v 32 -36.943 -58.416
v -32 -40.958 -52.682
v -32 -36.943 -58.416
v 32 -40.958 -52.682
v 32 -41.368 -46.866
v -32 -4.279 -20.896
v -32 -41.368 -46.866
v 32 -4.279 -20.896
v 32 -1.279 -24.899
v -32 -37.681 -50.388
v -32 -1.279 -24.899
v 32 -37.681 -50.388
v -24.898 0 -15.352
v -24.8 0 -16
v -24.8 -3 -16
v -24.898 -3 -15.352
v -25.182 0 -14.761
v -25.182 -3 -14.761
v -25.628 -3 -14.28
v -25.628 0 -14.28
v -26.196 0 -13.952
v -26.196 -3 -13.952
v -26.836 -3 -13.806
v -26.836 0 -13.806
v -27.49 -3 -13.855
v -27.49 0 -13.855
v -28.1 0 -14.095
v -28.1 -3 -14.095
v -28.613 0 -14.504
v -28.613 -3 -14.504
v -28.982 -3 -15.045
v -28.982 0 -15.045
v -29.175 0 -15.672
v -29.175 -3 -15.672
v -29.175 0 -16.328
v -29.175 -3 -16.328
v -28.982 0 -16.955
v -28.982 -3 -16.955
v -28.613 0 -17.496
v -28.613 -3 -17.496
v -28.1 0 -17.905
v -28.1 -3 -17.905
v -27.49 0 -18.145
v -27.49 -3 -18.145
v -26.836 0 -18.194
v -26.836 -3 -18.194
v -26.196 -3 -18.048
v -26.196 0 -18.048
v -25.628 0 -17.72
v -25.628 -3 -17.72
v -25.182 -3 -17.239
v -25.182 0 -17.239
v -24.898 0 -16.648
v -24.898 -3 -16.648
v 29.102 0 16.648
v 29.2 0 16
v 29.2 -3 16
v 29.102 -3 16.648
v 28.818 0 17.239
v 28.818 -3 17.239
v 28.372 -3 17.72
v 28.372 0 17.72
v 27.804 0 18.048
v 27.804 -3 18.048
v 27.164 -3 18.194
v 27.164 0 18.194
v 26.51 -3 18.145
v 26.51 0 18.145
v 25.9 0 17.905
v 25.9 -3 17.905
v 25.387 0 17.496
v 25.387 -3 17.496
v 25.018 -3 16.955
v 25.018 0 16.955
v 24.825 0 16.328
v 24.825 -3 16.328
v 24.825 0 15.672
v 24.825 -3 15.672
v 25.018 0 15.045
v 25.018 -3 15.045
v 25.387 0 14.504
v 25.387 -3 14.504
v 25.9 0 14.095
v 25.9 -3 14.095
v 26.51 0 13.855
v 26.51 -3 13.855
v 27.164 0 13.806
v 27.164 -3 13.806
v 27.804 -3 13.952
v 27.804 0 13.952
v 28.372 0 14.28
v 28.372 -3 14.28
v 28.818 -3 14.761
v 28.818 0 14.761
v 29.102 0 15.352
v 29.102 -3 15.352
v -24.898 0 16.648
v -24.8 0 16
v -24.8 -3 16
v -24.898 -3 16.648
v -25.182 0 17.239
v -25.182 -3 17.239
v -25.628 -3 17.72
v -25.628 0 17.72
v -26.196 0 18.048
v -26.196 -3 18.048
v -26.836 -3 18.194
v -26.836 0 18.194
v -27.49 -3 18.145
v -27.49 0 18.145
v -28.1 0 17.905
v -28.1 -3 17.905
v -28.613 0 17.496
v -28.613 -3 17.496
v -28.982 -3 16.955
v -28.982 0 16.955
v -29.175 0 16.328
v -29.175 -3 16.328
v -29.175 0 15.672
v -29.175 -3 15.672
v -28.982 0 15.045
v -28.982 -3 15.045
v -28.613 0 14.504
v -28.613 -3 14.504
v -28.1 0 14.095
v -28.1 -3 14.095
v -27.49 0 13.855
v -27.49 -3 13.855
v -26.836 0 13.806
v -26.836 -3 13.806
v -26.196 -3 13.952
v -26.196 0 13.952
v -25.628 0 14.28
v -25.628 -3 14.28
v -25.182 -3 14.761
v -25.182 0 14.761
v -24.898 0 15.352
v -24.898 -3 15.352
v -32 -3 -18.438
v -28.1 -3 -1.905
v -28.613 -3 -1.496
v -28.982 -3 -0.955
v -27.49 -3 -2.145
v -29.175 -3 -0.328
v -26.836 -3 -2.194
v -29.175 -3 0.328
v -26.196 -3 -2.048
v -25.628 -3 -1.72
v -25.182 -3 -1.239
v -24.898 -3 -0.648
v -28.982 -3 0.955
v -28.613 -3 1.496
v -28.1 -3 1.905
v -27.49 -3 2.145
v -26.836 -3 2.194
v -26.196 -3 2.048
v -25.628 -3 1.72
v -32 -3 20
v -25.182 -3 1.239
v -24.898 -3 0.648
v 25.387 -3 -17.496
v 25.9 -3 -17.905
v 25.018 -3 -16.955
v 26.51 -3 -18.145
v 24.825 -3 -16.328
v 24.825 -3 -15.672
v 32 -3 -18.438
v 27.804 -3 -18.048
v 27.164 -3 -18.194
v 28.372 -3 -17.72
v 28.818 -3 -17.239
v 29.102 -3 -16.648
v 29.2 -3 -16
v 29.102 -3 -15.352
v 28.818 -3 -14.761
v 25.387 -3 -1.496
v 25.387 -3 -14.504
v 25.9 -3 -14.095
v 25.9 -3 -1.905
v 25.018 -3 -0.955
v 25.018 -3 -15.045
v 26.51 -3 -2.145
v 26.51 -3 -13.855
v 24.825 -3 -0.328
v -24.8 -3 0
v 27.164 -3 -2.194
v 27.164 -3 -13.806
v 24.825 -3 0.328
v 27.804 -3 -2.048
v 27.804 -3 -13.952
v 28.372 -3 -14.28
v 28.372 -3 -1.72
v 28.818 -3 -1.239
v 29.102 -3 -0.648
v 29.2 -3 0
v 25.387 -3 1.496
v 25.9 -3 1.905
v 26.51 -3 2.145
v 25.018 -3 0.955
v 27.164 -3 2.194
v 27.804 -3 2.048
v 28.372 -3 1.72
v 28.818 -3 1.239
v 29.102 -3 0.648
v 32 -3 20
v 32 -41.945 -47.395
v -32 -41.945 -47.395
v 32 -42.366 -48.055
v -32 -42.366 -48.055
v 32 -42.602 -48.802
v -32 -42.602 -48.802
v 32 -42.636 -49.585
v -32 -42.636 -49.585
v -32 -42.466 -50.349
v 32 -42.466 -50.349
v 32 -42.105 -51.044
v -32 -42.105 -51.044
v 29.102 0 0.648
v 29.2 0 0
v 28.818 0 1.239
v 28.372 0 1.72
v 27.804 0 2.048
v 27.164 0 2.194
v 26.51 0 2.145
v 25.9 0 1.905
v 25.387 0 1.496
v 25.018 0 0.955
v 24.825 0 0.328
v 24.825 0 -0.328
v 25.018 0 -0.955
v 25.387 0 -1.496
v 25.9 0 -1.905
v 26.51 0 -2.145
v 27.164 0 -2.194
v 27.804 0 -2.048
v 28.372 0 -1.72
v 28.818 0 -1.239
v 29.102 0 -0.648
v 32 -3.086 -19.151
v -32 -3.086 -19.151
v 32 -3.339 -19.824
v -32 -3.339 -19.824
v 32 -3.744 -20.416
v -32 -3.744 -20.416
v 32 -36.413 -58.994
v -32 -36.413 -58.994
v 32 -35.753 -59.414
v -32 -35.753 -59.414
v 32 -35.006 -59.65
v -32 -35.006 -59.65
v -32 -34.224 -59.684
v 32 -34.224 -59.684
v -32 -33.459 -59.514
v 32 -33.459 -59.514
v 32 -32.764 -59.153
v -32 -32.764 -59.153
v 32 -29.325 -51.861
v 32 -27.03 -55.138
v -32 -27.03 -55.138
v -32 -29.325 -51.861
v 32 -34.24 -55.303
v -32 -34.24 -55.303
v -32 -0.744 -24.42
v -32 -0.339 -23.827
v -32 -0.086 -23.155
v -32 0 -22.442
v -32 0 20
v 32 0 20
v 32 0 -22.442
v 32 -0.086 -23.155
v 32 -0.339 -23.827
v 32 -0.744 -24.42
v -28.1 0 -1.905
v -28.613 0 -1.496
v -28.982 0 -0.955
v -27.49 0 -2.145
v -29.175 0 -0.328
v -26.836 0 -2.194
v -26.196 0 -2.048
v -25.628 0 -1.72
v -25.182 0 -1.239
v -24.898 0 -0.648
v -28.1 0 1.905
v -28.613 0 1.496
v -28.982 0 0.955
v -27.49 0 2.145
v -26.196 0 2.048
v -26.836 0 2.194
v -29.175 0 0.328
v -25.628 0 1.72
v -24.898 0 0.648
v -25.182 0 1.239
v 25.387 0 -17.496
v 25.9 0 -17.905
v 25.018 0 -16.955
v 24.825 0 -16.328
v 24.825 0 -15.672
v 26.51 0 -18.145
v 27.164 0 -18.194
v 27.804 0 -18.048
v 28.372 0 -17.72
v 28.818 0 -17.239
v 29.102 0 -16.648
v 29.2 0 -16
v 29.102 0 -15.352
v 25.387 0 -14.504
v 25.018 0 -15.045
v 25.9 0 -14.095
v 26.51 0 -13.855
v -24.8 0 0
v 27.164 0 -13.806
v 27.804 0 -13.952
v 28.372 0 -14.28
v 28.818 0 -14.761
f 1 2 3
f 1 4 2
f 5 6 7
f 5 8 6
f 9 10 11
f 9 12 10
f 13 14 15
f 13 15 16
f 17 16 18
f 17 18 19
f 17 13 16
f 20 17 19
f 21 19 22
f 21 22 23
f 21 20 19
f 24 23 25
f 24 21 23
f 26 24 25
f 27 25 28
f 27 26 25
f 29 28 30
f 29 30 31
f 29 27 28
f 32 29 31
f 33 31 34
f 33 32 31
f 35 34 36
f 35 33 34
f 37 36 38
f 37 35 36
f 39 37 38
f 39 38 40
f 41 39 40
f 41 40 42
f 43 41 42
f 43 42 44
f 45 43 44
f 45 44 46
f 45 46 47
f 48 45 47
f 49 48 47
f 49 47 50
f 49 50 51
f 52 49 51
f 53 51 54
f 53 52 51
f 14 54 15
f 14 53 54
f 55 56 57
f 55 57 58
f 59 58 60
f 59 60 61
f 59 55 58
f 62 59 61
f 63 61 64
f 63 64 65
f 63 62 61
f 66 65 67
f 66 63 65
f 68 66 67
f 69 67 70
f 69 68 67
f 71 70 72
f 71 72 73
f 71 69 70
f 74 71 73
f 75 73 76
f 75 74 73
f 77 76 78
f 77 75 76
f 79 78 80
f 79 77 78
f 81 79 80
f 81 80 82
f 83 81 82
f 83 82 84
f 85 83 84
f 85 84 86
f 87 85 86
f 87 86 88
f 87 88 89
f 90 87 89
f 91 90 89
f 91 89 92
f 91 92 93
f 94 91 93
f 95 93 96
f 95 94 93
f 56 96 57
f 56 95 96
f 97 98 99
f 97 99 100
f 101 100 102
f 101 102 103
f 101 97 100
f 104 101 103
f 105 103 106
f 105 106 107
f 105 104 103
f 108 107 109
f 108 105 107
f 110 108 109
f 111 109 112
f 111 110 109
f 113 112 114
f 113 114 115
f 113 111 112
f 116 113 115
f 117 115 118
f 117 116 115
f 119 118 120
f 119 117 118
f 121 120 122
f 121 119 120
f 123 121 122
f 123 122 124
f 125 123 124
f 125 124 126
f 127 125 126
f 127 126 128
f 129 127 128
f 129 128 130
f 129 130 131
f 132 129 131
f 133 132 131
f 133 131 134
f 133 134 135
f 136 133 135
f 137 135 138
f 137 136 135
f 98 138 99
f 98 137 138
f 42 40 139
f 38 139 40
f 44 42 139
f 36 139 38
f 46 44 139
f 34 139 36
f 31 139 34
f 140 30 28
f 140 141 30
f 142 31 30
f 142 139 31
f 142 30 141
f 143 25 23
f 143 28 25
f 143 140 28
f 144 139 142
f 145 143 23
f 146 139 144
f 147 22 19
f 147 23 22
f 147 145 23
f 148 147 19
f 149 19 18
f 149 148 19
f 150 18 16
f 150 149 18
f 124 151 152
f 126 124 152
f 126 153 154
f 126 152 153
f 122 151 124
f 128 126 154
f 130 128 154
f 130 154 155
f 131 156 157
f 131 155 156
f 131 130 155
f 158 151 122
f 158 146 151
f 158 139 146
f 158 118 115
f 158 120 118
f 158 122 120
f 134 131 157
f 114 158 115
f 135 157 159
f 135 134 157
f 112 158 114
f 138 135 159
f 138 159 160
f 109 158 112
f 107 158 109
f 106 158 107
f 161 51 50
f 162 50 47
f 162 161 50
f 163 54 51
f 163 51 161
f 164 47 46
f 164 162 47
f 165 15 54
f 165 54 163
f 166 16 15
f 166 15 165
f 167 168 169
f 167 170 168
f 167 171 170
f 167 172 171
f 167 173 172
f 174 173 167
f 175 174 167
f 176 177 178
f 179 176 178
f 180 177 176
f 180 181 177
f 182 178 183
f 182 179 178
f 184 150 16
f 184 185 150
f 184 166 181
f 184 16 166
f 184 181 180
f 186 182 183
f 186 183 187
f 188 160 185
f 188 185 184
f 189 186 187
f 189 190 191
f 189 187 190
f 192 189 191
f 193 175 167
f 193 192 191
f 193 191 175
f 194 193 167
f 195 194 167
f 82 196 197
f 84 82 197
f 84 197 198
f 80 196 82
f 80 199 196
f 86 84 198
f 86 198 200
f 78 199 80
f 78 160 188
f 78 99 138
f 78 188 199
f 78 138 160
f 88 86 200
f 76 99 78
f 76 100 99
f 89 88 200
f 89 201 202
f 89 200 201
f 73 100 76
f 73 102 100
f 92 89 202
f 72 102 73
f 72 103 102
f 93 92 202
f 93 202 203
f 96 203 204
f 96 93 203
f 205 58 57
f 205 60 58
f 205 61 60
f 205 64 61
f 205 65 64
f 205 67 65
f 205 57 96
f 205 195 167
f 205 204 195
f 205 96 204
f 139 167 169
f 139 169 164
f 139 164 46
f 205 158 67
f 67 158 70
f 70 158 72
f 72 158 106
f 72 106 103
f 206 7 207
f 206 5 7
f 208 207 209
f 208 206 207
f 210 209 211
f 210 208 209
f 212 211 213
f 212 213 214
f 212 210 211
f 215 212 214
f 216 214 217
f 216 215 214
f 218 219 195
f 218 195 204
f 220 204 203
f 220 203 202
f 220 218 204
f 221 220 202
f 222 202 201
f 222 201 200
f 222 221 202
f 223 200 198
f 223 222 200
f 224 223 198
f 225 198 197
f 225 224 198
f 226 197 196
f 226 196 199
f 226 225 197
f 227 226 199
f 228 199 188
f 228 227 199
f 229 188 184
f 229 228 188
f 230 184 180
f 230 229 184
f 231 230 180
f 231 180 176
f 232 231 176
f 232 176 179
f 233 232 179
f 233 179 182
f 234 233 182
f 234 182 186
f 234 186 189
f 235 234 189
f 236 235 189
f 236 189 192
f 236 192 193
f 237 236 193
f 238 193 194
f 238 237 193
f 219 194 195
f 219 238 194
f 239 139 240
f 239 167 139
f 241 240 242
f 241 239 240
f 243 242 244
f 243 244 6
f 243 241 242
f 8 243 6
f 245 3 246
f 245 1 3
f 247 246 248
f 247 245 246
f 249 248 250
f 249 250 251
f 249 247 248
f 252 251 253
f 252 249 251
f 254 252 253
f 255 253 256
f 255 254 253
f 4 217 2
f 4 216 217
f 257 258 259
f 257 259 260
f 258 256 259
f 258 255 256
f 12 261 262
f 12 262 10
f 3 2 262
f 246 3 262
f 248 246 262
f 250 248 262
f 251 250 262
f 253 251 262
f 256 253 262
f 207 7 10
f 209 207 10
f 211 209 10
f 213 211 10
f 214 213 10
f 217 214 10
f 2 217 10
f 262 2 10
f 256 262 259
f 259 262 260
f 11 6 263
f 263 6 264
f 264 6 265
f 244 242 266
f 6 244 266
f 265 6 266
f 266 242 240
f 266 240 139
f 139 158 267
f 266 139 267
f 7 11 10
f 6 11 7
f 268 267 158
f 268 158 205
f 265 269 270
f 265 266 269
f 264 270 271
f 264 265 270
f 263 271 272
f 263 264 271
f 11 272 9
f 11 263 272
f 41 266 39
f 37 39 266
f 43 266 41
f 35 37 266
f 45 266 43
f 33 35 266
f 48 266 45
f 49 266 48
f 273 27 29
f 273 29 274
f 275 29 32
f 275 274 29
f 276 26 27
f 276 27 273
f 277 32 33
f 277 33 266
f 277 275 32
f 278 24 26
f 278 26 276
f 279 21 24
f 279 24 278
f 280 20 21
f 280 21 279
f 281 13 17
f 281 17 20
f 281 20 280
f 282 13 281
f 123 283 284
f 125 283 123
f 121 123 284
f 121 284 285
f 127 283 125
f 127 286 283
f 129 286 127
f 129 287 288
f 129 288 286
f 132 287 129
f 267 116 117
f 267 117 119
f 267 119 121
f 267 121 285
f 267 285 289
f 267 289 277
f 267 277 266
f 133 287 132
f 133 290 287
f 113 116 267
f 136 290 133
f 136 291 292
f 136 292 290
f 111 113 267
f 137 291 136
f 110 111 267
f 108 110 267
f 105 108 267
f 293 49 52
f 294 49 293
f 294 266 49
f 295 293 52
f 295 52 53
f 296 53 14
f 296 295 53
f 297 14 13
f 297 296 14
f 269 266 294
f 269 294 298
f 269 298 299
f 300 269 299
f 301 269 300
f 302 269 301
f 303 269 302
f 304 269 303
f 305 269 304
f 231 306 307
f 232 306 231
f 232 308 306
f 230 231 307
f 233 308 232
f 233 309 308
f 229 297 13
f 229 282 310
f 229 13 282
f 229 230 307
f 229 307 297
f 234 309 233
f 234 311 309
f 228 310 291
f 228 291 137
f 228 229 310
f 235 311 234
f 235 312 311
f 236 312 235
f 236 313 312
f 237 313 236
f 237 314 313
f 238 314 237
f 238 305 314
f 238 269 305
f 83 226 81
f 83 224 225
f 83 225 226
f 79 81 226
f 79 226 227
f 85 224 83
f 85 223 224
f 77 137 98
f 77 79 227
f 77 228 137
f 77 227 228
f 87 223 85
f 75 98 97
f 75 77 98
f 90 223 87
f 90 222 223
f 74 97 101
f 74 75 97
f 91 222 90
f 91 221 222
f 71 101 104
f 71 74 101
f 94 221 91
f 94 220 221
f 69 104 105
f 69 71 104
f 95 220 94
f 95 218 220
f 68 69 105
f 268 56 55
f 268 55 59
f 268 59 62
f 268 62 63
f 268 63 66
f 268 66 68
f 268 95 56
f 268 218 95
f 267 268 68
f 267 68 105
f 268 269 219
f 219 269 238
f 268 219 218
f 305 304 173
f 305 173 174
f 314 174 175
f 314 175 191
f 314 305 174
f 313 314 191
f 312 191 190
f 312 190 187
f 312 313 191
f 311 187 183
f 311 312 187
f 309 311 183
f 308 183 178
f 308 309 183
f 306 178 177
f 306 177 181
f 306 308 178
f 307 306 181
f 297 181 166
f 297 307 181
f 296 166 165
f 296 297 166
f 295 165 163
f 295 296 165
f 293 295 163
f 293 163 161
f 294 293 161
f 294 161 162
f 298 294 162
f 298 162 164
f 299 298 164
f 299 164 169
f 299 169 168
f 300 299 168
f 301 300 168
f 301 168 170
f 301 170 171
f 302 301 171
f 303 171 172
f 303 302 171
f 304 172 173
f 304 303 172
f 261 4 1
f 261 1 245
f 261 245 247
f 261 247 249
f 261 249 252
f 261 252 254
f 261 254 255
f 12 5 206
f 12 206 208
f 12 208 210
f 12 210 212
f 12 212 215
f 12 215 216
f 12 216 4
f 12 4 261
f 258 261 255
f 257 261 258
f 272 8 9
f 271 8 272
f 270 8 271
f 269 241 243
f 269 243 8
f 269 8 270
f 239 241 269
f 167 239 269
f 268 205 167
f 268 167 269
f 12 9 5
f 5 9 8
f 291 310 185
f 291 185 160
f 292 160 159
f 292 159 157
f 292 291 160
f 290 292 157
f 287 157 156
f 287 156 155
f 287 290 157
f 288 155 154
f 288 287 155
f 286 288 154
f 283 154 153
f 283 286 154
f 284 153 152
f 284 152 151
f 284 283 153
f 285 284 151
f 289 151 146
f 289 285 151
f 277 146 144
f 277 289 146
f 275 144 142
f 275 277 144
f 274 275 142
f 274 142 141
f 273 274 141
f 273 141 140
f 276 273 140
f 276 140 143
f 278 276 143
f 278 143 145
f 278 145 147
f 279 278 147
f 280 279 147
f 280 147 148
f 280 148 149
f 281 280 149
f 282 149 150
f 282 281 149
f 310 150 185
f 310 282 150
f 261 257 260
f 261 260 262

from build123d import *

# Parameters (mm, degrees)
F0_W     = 64
F0_H     = 40
F0_R     = 2.2
F1_DEPTH = 3
F3_DEPTH = 32
F4_R     = 3


with BuildPart() as f1:
    # F0 (on Front) → F1 (new body)
    with BuildSketch(Plane.XZ):
        Rectangle(F0_W, F0_H)
        with Locations((-27, -16)):
            Circle(F0_R, mode=Mode.SUBTRACT)
        with Locations((27, -16)):
            Circle(F0_R, mode=Mode.SUBTRACT)
        with Locations((-27, 0)):
            Circle(F0_R, mode=Mode.SUBTRACT)
        with Locations((-27, 16)):
            Circle(F0_R, mode=Mode.SUBTRACT)
        with Locations((27, 0)):
            Circle(F0_R, mode=Mode.SUBTRACT)
        with Locations((27, 16)):
            Circle(F0_R, mode=Mode.SUBTRACT)
    extrude(amount=F1_DEPTH)

    # F2 (on Right) → F3 (join, symmetric)
    with BuildSketch(Plane.YZ):
        Polygon((0, -20), (-3, -20), (-43.8254843962, -48.5863119253), (-40.9576022144, -52.6820721467), (-37.6809940373, -50.3877664013), (0, -24.0032503292), align=None)
        Polygon((-37.6809940373, -50.3877664013), (-40.9576022144, -52.6820721467), (-35.2218378509, -60.8735925896), (-27.030317408, -55.1378282261), (-29.3246231535, -51.861220049), (-34.2395354192, -55.3026786671), align=None)
    extrude(amount=F3_DEPTH, both=True)

    # F4
    f4_edges = [f1.edges().sort_by_distance(p)[0] for p in [
        (0, -3, -20),
        (0, 0, -24.00325),
        (0, -43.825484, -48.586312),
        (0, -35.221838, -60.873593),
    ]]
    fillet(f4_edges, radius=F4_R)


solid = f1.part
